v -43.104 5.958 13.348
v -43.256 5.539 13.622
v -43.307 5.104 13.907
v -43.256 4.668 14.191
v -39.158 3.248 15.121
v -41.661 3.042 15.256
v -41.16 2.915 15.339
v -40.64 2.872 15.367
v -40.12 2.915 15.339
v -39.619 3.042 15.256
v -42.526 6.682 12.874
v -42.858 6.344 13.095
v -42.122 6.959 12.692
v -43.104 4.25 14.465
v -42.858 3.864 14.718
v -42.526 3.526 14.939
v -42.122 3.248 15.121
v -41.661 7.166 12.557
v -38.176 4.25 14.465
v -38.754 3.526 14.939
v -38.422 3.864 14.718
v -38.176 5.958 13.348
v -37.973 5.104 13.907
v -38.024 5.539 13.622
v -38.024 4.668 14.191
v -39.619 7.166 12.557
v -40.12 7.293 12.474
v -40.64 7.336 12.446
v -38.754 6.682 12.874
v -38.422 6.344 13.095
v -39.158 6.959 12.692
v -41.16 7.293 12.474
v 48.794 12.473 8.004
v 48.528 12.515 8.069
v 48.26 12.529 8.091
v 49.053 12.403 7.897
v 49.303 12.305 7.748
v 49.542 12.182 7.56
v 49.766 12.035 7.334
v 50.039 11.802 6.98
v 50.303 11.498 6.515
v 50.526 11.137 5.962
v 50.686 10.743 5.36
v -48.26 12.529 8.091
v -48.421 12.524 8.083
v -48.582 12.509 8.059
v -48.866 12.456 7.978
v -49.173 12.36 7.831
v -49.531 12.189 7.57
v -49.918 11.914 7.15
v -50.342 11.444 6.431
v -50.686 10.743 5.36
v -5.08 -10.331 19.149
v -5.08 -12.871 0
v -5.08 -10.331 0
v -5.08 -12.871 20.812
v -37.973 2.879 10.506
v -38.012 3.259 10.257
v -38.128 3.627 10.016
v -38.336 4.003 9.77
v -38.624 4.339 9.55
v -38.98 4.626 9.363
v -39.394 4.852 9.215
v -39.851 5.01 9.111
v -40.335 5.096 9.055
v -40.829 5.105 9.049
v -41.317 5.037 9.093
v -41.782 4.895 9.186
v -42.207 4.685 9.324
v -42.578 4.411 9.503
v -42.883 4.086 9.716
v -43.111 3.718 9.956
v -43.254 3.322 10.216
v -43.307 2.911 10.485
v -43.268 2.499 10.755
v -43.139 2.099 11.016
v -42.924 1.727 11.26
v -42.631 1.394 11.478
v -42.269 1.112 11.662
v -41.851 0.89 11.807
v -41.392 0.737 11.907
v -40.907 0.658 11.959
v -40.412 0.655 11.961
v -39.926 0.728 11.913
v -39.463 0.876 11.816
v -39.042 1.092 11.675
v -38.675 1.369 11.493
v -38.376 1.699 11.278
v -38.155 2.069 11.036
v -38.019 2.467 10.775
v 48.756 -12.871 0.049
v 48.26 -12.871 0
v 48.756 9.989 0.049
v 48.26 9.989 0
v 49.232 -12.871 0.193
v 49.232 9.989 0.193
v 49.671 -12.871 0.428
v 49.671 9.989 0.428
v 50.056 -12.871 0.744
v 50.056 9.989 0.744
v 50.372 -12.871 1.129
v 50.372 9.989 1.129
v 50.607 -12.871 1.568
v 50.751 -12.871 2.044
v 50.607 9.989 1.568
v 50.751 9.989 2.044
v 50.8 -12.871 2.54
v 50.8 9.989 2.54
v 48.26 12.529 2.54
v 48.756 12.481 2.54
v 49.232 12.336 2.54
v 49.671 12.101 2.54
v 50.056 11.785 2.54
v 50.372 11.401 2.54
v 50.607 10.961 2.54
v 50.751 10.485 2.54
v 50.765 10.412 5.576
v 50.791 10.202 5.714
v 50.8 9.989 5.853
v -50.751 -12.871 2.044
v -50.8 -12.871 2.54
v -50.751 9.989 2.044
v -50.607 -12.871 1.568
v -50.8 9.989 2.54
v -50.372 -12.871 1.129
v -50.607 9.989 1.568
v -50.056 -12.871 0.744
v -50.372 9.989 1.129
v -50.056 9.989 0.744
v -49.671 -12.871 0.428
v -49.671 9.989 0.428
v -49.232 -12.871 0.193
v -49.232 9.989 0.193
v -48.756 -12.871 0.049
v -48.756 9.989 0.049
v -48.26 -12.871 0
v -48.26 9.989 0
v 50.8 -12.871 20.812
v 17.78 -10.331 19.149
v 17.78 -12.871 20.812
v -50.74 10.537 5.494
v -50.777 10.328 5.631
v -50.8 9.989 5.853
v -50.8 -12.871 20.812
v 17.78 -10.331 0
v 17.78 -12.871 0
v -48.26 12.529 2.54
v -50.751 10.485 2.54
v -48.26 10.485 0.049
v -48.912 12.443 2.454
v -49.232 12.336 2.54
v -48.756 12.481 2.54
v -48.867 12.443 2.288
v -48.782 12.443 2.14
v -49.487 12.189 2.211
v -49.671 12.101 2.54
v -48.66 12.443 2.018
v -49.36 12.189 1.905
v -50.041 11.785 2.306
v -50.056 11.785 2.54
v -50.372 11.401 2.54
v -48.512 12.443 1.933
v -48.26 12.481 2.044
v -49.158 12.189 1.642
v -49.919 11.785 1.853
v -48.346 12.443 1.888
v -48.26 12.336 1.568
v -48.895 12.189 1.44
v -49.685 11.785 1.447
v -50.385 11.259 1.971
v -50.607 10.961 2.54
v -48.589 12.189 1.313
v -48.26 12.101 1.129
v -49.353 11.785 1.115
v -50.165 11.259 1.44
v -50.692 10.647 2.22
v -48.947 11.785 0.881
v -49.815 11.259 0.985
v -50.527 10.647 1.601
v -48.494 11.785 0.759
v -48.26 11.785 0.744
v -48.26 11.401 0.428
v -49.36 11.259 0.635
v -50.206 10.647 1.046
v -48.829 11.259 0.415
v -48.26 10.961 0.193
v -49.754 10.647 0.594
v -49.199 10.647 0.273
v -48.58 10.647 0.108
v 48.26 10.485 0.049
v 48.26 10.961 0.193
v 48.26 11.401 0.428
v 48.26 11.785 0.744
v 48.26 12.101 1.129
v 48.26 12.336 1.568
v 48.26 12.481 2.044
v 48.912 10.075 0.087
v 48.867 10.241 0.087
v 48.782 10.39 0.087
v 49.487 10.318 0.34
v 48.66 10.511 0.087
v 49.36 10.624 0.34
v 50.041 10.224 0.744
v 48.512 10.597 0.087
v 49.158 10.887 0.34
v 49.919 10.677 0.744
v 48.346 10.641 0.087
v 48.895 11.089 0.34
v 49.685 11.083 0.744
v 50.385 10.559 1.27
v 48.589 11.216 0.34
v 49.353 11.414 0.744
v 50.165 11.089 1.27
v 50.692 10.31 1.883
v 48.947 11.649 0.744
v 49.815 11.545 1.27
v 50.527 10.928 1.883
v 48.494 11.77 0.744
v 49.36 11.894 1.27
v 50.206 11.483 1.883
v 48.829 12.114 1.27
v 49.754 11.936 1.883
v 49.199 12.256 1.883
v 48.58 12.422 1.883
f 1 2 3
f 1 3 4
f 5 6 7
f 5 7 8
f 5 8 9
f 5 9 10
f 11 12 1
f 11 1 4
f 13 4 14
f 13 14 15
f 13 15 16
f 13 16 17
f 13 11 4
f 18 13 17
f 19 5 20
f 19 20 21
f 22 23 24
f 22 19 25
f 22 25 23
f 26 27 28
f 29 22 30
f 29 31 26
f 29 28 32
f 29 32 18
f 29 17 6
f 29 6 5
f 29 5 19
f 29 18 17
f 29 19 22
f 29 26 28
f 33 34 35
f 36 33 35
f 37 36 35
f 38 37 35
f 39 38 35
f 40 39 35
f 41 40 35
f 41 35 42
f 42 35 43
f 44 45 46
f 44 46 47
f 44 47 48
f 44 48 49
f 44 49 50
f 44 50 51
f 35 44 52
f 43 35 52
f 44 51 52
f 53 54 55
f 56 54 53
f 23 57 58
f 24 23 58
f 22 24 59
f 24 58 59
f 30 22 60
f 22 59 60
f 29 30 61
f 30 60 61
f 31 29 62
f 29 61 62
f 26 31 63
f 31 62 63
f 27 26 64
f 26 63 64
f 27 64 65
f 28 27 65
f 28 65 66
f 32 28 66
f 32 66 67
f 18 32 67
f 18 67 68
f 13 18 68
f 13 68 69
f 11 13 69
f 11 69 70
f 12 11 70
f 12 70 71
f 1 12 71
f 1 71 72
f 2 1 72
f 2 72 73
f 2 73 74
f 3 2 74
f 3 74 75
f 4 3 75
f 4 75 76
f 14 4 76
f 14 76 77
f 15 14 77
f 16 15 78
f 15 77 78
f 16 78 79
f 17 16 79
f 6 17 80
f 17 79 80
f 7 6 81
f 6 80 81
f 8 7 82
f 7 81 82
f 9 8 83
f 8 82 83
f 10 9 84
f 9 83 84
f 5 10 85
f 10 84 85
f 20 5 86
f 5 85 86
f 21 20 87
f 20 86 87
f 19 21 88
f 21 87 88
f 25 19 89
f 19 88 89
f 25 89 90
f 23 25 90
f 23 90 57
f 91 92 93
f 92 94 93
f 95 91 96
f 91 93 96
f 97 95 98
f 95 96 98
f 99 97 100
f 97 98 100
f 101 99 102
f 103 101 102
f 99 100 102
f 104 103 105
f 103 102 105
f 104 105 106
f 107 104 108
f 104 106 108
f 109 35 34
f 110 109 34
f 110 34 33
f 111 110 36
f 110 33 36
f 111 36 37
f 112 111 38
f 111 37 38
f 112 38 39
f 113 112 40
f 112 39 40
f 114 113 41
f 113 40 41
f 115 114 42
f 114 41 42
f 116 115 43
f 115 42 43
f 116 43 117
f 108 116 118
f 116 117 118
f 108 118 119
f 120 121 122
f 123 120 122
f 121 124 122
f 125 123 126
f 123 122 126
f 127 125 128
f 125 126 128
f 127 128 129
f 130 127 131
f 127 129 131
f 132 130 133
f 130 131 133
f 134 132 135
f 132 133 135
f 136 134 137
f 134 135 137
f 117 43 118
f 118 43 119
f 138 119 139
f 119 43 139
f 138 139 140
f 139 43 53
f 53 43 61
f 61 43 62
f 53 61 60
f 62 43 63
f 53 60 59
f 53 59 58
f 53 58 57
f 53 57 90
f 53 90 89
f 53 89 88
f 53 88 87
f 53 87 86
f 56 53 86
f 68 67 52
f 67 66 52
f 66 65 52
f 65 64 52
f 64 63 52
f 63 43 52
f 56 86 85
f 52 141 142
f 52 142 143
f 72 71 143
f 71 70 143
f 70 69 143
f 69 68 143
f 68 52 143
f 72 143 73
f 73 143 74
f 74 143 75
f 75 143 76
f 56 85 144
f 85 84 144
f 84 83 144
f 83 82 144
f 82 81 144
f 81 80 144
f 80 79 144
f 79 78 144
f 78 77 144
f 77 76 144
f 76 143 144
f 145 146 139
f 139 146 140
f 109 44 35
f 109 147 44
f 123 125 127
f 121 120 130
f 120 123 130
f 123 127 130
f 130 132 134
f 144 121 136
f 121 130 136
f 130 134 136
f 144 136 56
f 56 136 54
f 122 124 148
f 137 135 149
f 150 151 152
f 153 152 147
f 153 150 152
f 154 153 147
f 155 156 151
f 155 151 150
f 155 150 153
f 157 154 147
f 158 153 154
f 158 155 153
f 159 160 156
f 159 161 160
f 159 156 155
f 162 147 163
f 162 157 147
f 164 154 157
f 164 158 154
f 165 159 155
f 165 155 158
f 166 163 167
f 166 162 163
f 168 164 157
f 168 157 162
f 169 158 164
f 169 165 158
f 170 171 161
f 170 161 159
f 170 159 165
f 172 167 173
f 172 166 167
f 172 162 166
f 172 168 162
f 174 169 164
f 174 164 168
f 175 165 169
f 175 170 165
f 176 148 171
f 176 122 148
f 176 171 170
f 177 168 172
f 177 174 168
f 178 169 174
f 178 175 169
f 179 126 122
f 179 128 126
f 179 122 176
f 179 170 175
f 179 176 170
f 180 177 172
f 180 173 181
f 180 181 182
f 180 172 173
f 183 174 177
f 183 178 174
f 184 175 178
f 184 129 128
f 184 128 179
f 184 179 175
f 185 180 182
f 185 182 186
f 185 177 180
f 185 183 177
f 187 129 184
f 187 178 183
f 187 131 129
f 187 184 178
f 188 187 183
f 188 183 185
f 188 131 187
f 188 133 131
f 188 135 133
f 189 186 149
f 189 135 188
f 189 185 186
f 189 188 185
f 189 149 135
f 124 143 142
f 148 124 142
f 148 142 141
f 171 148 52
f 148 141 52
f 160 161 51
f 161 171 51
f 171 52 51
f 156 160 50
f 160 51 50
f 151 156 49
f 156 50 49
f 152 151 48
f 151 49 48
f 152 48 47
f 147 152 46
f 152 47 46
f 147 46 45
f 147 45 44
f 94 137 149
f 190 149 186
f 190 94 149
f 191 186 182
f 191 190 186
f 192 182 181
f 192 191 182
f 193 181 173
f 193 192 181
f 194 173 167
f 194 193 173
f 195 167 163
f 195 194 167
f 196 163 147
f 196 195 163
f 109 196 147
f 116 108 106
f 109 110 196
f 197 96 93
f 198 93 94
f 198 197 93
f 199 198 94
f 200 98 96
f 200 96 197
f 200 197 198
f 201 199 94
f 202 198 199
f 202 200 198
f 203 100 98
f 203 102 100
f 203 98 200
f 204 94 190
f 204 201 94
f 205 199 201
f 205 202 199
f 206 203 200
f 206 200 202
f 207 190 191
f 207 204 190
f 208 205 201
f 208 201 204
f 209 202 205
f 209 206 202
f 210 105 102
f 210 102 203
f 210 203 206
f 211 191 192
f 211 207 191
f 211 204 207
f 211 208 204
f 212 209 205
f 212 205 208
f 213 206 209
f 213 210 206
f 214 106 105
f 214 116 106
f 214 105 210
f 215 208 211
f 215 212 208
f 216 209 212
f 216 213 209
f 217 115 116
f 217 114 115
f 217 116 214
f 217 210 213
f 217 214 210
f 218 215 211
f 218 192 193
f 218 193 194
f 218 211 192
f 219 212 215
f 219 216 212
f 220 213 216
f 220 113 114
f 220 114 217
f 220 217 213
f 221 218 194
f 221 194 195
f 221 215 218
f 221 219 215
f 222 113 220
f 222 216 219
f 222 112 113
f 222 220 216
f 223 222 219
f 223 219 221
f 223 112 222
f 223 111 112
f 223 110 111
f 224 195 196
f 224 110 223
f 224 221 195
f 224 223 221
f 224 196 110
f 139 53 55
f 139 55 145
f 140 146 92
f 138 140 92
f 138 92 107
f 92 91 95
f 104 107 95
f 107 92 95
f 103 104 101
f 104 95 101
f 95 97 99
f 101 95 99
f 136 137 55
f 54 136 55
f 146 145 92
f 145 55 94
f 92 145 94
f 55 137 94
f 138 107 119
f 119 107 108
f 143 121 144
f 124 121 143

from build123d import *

# Parameters (mm, degrees)
F0_W     = 101.6
F0_H     = 25.4
F1_DEPTH = 25.4
F3_DEPTH = 101.6
F4_R     = 2.54
F5_R     = 2.667
F6_DEPTH = 4.064
F7_W     = 22.86
F7_H     = 20.81151
F8_DEPTH = 2.54


with BuildPart() as f1:
    # F0 (on Top) → F1 (new body)
    with BuildSketch(Plane.XY):
        with Locations((0, -0.170567)):
            Rectangle(F0_W, F0_H)
    extrude(amount=F1_DEPTH)

    # F2 (on face) → F3 (cut, through all)
    with BuildSketch(Plane(origin=(-50.8, 0, 0), x_dir=(0, -1, 0), z_dir=(-1, 0, 0))):
        Polygon((-12.529433, 25.4), (-12.529433, 8.090758), (-10.742588, 5.36007), (12.870567, 20.81151), (12.870567, 25.4), align=None)
    extrude(amount=-F3_DEPTH, mode=Mode.SUBTRACT)

    # F4
    f4_edges = [f1.edges().sort_by_distance(p)[0] for p in [
        (50.8, 12.529433, 4.045379),
        (50.8, -0.170567, 0),
        (-50.8, -0.170567, 0),
        (-50.8, 12.529433, 4.045379),
        (0, 12.529433, 0),
    ]]
    fillet(f4_edges, radius=F4_R)

    # F5 (on face) → F6 (join)
    with BuildSketch(Plane(origin=(0, 5.676581, 8.675048), x_dir=(1, 0, 0), z_dir=(0, 0.547549, 0.836774))):
        with Locations((-40.64, -3.343786)):
            Circle(F5_R)
    extrude(amount=F6_DEPTH)

    # F7 (on face) → F8 (cut)
    with BuildSketch(Plane.XZ.offset(12.870567)):
        with Locations((6.35, 10.405755)):
            Rectangle(F7_W, F7_H)
    extrude(amount=-F8_DEPTH, mode=Mode.SUBTRACT)


solid = f1.part
